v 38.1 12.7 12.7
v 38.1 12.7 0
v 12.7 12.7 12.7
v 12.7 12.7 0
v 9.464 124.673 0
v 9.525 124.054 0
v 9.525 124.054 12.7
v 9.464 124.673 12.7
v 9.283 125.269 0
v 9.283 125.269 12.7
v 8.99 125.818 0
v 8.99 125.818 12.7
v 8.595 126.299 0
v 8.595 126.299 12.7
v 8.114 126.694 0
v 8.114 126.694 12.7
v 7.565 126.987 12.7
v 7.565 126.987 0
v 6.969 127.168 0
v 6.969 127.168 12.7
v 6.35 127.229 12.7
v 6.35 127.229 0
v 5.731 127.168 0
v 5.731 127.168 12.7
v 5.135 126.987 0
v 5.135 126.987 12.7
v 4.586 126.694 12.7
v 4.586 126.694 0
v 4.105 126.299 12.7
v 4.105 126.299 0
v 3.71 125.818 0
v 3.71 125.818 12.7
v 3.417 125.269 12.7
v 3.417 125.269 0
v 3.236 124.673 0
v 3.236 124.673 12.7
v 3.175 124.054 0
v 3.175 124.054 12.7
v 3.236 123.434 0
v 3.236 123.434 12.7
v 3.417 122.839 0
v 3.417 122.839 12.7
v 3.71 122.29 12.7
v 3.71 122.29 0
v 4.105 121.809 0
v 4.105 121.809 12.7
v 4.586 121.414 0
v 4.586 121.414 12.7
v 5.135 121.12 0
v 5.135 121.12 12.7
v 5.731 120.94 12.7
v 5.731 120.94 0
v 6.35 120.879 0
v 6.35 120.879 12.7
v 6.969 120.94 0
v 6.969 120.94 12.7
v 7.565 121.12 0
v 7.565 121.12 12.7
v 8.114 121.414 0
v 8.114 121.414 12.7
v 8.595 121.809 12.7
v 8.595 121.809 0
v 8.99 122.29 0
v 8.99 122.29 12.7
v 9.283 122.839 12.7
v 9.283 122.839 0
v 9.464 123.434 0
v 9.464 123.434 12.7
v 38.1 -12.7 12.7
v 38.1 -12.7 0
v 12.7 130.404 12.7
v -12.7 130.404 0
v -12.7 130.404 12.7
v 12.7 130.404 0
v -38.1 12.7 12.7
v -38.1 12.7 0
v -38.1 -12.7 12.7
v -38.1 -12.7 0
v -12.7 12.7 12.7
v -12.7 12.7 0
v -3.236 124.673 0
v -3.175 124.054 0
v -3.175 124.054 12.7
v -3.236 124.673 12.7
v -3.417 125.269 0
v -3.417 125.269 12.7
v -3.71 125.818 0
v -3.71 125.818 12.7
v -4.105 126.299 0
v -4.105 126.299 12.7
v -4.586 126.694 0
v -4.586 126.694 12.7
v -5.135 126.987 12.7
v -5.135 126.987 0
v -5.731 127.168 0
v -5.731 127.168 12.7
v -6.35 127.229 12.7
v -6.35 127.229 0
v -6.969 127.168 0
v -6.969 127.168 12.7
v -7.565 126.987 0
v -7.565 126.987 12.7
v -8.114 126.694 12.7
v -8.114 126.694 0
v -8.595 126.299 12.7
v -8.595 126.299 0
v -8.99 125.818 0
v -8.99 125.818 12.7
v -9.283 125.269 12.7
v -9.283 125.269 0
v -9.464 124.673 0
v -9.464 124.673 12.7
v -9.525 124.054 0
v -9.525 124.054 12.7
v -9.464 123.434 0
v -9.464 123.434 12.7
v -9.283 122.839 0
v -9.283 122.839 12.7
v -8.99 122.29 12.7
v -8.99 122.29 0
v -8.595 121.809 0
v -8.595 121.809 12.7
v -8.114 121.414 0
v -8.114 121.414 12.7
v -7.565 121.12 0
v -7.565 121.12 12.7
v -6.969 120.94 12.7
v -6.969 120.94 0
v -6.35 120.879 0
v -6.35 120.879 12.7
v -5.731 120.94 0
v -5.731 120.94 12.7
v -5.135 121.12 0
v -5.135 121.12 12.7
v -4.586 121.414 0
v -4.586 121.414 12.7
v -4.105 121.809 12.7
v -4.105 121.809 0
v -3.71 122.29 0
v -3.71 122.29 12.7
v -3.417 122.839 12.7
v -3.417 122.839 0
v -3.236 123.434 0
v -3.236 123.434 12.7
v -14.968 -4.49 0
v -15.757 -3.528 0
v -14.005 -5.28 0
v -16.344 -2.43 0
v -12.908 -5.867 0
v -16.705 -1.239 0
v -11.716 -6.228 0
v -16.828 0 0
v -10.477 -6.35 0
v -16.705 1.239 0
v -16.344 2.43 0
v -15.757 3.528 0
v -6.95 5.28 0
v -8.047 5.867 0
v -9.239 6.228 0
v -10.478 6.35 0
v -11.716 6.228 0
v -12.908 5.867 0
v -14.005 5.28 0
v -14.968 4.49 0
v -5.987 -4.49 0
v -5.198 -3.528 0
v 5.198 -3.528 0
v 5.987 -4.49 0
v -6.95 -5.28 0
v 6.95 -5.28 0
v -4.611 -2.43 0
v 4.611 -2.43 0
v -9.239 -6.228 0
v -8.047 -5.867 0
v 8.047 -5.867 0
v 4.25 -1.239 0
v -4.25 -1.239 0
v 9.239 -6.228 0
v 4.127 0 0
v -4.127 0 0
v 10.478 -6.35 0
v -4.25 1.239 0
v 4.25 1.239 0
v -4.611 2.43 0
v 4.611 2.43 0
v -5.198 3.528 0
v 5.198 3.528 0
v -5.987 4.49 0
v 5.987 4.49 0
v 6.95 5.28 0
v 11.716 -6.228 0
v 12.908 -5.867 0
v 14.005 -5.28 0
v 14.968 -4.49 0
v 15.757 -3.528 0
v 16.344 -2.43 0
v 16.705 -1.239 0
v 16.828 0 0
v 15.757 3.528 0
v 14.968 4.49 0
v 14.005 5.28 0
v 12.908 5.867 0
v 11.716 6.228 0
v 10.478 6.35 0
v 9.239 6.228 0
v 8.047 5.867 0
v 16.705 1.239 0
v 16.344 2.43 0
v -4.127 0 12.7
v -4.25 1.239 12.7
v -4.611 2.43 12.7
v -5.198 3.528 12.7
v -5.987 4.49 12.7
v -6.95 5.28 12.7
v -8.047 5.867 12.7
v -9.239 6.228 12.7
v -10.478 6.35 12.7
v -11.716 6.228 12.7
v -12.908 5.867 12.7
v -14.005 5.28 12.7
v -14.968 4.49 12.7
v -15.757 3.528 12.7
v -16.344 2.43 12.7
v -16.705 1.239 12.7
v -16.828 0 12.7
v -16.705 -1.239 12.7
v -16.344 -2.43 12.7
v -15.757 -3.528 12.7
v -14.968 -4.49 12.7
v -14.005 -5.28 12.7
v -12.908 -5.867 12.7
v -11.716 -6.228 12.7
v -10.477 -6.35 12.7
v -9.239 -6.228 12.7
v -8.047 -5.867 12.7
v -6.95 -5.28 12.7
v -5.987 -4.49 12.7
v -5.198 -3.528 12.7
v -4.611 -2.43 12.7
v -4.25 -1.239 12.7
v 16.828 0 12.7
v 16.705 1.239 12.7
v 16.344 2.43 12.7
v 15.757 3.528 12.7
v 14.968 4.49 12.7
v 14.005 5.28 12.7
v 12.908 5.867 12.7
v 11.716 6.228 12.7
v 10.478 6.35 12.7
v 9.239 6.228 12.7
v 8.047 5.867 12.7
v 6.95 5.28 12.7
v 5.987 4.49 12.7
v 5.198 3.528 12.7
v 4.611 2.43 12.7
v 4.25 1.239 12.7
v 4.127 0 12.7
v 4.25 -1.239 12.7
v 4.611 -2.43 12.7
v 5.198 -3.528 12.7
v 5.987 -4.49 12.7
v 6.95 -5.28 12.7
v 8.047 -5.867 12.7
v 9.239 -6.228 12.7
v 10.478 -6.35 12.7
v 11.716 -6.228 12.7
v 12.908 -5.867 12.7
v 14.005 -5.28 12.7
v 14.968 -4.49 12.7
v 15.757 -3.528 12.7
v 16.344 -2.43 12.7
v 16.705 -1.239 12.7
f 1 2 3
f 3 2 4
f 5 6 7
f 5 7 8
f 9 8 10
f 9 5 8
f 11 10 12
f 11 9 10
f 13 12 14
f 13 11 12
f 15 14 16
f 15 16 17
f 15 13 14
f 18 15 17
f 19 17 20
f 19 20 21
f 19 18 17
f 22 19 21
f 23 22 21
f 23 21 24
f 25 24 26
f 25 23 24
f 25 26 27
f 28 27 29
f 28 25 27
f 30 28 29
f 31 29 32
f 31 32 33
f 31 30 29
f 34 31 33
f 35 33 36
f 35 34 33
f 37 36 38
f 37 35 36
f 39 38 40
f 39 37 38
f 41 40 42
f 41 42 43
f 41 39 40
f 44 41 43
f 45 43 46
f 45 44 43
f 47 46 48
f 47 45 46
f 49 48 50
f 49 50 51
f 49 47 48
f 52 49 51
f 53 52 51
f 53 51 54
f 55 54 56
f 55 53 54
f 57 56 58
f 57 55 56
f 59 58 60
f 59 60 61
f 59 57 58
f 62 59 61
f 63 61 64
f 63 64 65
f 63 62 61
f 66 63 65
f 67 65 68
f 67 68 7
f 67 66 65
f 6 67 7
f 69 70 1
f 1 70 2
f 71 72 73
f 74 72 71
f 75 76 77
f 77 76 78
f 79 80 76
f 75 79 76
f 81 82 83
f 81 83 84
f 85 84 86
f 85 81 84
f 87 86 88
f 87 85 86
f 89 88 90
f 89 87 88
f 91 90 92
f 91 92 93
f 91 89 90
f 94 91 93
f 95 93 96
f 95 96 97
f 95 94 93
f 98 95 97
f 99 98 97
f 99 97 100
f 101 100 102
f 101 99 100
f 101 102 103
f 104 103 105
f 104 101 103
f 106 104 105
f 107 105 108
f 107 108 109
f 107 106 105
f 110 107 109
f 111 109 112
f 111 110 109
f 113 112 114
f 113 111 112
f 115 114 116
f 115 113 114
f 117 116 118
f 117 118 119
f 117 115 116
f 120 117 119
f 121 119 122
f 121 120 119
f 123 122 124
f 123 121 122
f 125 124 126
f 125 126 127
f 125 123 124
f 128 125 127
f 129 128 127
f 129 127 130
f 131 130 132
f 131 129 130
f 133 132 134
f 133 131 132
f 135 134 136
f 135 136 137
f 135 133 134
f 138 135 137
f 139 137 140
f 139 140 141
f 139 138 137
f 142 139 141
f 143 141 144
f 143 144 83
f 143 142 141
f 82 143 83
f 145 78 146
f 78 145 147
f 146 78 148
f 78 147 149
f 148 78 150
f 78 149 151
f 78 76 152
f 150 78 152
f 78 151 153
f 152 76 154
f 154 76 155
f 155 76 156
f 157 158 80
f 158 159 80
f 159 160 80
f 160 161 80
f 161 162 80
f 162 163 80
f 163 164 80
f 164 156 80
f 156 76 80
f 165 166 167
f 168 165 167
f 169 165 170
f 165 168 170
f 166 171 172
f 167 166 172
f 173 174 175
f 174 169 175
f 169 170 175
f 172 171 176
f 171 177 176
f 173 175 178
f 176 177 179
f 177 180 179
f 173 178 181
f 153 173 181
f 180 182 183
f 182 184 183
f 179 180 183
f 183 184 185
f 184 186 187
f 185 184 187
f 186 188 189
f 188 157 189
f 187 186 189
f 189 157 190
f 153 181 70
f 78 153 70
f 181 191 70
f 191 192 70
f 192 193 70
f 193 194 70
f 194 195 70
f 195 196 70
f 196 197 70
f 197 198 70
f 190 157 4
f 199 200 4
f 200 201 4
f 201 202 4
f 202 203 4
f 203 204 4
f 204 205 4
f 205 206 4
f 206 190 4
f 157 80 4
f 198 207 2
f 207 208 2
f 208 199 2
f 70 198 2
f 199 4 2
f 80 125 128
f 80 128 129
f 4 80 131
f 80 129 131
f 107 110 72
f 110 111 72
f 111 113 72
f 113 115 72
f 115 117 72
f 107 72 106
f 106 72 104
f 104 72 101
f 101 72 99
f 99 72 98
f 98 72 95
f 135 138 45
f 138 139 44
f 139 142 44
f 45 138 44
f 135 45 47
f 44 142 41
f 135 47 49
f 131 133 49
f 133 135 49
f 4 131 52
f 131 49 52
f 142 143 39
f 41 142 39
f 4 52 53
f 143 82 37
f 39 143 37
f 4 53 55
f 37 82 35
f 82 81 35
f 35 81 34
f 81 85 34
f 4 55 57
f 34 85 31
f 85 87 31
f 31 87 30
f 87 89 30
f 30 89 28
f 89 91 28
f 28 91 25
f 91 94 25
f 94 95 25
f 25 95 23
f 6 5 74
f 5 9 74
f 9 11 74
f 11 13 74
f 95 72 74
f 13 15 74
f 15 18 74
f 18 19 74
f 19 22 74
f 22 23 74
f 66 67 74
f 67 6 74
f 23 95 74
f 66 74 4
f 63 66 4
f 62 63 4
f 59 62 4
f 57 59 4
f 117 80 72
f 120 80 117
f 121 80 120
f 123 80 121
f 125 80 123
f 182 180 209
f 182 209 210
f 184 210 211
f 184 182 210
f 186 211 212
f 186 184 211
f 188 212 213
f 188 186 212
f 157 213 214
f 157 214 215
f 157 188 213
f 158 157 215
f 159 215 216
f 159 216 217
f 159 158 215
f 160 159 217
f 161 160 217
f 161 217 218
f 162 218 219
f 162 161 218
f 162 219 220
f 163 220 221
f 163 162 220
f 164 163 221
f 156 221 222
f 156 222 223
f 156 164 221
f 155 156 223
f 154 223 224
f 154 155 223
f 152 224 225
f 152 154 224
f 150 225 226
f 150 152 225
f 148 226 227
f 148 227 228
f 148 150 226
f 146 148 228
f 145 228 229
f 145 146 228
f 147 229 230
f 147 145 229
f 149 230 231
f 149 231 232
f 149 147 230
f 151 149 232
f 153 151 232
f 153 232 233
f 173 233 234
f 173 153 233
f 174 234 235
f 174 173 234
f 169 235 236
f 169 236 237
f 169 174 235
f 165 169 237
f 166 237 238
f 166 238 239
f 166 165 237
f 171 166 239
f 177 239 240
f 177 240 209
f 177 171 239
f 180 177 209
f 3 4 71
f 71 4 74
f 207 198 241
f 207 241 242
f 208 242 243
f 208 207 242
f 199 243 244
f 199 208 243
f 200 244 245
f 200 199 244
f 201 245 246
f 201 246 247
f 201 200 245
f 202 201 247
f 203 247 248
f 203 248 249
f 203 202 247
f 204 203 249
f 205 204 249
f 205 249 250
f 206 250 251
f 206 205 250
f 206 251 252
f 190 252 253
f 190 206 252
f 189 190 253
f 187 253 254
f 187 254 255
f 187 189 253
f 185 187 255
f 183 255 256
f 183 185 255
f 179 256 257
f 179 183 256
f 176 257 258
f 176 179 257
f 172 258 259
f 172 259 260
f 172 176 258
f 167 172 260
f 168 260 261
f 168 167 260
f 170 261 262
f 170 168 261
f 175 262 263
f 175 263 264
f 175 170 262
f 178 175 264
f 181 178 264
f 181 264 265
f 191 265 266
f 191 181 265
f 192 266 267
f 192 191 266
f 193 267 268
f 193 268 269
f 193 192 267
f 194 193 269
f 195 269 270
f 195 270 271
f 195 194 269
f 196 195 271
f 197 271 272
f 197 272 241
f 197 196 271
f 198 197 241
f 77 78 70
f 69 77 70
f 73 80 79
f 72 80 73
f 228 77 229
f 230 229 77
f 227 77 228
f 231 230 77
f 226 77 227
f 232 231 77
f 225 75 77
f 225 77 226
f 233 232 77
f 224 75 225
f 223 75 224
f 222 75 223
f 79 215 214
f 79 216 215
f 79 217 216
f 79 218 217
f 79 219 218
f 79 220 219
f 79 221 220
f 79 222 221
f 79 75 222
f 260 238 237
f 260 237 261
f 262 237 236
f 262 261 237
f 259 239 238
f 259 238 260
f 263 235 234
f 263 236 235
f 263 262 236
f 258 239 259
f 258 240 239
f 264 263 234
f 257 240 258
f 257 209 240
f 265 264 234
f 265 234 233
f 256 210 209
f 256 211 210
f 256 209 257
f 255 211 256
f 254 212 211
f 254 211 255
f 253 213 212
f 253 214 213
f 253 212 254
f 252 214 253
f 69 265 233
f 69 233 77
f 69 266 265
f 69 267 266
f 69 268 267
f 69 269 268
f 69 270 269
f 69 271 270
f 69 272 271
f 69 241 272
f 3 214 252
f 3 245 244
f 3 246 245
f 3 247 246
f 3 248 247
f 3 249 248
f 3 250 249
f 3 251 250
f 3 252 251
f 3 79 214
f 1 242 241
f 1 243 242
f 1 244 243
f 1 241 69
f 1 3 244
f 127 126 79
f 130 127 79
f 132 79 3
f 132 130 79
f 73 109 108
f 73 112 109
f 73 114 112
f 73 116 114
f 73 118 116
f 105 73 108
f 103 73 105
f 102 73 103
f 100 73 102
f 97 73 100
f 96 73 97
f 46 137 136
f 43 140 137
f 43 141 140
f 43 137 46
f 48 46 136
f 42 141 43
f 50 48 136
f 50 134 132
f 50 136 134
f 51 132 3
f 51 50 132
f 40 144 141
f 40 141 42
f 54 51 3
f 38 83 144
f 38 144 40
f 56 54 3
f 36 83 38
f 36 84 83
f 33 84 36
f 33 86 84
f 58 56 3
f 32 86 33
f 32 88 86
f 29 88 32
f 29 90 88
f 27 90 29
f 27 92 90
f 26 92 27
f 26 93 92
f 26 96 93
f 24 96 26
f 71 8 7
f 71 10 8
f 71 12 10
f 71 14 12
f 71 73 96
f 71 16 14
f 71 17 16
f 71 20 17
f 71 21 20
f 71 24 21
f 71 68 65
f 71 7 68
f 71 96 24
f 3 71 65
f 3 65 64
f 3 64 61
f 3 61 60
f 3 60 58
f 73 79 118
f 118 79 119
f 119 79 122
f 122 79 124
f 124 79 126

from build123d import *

# Parameters (mm, degrees)
F0_R     = 6.35
F0_W     = 25.4
F0_H     = 117.7036
F0_R_2   = 3.175
F1_DEPTH = 12.7


with BuildPart() as f1:
    # F0 (on Top) → F1 (new body)
    with BuildSketch(Plane.XY):
        Polygon((38.1, -12.7), (38.1, 12.7), (12.7, 12.7), (-12.7, 12.7), (-38.1, 12.7), (-38.1, -12.7), align=None)
        with Locations((-10.4775, 0)):
            Circle(F0_R, mode=Mode.SUBTRACT)
        with Locations((10.4775, 0)):
            Circle(F0_R, mode=Mode.SUBTRACT)
        with Locations((0, 71.5518)):
            Rectangle(F0_W, F0_H)
        with Locations((-6.35, 124.0536)):
            Circle(F0_R_2, mode=Mode.SUBTRACT)
        with Locations((6.35, 124.0536)):
            Circle(F0_R_2, mode=Mode.SUBTRACT)
    extrude(amount=F1_DEPTH)


solid = f1.part
